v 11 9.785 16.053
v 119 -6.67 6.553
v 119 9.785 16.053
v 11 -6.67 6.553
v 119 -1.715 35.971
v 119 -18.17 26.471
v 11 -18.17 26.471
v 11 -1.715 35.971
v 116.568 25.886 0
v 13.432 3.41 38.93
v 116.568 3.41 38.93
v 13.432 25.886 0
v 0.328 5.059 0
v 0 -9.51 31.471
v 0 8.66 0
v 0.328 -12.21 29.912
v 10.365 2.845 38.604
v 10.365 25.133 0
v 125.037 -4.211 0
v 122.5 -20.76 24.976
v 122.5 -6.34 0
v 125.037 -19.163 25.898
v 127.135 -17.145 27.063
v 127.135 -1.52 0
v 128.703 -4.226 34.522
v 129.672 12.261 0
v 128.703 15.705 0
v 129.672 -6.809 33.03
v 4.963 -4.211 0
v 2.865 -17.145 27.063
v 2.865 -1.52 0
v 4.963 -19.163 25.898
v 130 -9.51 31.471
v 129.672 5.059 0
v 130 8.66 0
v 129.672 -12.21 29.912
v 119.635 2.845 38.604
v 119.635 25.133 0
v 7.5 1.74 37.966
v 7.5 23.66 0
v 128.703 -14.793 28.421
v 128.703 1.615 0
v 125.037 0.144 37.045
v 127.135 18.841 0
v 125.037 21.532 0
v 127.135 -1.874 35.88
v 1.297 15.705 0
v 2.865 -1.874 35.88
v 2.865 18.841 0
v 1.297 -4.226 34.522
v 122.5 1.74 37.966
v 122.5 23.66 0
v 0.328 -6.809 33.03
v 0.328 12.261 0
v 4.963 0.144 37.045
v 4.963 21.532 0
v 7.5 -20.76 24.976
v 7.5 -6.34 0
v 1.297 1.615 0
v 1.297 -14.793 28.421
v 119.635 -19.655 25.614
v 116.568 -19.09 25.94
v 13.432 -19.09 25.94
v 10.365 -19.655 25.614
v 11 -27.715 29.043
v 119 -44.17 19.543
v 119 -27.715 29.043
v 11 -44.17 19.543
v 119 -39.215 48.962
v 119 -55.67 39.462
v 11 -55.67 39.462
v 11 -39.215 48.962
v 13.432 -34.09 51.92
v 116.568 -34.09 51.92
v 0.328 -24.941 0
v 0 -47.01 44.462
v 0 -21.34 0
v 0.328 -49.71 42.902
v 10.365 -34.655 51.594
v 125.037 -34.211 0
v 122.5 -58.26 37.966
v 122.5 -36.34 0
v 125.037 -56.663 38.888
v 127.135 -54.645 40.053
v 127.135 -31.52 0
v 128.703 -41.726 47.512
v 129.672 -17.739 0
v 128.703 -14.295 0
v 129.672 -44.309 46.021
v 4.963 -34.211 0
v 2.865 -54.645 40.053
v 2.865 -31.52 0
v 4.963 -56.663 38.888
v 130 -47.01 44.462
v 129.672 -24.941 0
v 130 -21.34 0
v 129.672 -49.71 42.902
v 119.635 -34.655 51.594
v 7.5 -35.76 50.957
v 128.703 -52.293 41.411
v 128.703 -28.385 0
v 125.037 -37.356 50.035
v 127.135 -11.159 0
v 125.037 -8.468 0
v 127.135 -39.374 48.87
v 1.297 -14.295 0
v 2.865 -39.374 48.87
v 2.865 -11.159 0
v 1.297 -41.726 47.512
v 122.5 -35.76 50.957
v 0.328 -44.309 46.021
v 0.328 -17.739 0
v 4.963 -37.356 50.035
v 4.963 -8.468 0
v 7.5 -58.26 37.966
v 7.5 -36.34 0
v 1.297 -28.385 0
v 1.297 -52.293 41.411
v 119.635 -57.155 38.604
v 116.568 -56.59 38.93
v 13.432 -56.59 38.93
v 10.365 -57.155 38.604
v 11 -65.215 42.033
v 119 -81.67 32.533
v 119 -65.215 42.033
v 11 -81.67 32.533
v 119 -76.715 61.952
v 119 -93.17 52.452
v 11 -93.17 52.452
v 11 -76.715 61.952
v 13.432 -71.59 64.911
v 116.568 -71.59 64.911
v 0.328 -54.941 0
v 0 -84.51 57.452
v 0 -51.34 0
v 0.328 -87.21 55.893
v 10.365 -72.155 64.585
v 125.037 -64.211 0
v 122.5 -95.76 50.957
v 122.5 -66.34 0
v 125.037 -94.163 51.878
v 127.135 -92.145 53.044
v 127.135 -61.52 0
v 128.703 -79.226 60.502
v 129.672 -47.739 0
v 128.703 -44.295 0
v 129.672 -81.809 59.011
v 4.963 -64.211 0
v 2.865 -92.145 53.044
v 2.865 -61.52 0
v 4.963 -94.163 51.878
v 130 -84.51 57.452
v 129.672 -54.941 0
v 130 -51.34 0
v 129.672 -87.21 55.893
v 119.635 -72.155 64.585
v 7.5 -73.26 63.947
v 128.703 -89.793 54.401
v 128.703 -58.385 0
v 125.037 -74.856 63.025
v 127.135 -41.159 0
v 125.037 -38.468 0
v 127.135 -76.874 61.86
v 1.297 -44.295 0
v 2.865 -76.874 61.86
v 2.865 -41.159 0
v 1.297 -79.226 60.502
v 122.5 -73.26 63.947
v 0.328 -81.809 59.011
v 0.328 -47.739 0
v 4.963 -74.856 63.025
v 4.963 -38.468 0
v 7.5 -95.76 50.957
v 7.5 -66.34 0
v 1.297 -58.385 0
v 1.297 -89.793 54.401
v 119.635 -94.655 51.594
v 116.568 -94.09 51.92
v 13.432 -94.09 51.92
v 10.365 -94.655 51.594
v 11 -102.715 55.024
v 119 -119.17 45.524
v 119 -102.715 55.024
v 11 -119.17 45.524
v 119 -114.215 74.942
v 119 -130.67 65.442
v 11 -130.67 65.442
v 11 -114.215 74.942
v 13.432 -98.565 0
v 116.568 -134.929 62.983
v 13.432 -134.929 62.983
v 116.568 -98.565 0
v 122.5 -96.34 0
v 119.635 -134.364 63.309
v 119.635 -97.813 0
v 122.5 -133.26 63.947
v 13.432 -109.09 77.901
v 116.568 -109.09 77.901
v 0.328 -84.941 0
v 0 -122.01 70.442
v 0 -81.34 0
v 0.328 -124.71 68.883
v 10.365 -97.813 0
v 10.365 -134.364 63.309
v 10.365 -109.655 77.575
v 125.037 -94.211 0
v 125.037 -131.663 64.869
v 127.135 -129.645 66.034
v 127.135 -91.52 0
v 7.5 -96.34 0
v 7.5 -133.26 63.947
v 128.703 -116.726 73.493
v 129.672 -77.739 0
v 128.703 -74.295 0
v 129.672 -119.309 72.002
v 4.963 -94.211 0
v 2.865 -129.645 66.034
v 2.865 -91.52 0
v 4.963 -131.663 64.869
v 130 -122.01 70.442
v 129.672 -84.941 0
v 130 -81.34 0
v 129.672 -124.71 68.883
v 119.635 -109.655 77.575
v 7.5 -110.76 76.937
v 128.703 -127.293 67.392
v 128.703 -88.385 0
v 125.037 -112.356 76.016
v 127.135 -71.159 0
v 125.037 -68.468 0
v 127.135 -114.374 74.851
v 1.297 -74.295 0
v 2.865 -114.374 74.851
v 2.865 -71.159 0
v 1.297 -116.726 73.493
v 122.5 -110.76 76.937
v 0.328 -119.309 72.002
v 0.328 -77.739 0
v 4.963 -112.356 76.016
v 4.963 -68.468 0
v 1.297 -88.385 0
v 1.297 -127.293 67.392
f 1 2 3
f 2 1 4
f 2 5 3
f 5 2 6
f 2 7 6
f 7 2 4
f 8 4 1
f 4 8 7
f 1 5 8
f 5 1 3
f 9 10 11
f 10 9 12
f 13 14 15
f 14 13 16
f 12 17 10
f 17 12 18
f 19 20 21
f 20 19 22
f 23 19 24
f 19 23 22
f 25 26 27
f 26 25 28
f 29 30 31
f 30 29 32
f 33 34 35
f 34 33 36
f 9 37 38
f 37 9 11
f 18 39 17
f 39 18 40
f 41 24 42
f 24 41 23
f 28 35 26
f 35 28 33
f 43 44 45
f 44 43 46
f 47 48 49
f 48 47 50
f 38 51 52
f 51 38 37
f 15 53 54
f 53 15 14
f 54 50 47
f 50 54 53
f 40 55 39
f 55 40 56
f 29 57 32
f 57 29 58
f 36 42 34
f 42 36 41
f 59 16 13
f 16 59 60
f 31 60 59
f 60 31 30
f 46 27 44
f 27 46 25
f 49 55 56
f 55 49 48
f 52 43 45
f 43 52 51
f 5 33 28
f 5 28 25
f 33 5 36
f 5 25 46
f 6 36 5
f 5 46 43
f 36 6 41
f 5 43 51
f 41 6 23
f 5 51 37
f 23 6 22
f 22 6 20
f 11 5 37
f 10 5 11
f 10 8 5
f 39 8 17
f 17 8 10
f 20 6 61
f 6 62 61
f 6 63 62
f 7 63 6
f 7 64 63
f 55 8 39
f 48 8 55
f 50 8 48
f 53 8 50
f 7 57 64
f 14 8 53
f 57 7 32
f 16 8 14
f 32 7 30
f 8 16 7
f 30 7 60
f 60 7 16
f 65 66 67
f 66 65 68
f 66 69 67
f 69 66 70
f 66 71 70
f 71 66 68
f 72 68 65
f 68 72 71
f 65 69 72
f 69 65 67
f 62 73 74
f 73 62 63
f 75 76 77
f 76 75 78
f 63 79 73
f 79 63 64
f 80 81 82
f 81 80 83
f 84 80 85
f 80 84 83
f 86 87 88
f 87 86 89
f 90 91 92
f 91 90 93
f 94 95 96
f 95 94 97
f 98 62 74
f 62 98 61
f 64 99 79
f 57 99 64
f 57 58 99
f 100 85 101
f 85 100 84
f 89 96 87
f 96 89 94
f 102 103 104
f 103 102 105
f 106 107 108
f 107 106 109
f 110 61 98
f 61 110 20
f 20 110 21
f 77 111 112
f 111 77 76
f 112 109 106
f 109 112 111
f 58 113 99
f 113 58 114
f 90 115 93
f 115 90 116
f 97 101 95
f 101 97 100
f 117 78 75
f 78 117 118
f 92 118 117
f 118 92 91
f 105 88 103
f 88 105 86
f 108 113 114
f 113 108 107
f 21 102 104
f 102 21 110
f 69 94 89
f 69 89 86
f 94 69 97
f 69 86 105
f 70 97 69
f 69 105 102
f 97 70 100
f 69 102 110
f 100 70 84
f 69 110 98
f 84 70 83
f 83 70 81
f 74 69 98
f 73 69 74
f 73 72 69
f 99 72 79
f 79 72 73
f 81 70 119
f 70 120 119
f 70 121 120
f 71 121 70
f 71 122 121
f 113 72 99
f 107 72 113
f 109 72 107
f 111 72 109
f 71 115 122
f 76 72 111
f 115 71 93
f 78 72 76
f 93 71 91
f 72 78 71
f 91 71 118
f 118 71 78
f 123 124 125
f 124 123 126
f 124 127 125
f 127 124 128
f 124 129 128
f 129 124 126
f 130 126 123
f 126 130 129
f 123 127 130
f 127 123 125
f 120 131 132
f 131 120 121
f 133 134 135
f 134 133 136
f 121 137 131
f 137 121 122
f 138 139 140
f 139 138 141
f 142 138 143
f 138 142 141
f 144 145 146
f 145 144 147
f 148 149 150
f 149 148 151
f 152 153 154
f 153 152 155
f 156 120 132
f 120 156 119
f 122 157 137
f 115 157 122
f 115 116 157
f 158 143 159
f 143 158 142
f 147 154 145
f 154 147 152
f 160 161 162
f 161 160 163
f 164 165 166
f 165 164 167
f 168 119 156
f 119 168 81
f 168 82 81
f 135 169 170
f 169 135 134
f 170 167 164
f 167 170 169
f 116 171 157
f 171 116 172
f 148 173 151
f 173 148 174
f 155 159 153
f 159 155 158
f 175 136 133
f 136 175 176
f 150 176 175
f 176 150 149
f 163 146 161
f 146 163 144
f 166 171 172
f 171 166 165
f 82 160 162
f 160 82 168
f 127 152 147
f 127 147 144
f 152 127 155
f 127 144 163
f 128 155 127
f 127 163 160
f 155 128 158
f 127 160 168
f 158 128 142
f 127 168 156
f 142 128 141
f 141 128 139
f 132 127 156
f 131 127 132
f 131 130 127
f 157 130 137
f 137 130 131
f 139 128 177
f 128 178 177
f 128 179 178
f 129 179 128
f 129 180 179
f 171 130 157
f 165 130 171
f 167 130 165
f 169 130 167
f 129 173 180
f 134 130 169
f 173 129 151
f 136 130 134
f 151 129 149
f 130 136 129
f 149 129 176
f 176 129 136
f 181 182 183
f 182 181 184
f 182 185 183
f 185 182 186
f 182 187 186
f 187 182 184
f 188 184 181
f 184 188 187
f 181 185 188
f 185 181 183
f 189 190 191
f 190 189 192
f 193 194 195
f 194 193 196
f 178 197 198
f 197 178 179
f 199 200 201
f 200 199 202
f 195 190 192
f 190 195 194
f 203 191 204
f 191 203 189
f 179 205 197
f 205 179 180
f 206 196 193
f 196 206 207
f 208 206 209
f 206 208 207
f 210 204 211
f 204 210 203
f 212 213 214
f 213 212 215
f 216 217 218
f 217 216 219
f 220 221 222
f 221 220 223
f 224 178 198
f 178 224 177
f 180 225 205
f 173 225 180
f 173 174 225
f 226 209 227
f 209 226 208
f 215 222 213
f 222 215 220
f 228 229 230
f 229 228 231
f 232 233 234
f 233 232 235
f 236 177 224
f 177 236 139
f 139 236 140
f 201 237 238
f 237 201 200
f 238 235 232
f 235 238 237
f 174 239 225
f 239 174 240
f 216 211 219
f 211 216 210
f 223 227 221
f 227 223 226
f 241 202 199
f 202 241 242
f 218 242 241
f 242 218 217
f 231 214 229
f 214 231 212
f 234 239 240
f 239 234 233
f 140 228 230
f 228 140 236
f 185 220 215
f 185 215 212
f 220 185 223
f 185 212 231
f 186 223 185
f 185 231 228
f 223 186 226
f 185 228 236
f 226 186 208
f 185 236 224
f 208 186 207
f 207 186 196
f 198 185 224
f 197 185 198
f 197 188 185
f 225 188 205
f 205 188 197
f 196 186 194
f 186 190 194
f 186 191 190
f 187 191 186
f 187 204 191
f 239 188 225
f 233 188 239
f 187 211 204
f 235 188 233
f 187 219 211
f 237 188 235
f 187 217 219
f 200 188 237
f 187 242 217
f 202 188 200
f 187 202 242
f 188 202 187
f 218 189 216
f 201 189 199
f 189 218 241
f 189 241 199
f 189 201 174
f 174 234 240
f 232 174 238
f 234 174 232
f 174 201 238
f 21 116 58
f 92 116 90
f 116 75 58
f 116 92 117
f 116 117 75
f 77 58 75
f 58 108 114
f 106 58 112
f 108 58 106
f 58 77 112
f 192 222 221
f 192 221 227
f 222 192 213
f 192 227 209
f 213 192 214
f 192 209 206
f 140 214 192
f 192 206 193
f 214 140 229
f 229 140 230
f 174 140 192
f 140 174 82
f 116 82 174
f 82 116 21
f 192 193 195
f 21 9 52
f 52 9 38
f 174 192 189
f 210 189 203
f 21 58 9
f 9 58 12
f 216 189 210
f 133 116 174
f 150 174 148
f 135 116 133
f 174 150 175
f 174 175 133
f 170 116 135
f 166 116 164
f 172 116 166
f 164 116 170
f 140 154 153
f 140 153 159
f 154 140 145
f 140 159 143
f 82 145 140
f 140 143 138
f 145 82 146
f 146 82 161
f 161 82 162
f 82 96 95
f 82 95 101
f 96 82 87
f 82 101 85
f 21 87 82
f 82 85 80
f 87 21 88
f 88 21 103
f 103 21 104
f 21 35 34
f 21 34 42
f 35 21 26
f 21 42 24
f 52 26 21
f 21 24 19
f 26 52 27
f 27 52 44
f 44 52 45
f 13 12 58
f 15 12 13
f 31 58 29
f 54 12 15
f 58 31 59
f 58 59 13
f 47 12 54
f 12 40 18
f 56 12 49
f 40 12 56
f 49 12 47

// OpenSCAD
//Amount of cart slots
cart_count = 4; //[1:1:8]
//Cart type
cart_type = 5; //[0:Snes PAL, 1:Snes NTSC, 2:N64, 3:Gameboy/GBA, 4:DS/3DS, 5:NES]
//Support leg length (mm)
support_legs_length = 0; //[0:1:100]
//Cart angle (degree)
cart_angle = 30; //[0:1:30]
//Leveled
leveled = 0; //[0:False, 1:True]

module cart_cup(cup_height, cup_width, cup_depth, cart_hole_depth, support_legs_length, cup_angle) {
    
    difference() {
        
        union() {
            translate([0,cup_depth/2,0])
            hull() {
                translate([cup_depth/2,0,0])
                cylinder(h=cup_height, d=cup_depth);
                
                translate([cup_width-cup_depth/2,0,0])
                cylinder(h=cup_height, d=cup_depth);
            }
            
            
            for(j = [cup_width/4, cup_width*3/4]) {
            
                translate([j - 10/2, -(support_legs_length*cos(cup_angle)), 
                                                cup_depth*sin(cup_angle)])
                cube([10,   support_legs_length*cos(cup_angle),
                            support_legs_length*sin(cup_angle)]);
            }

        }
        translate([cup_width/2,0,cup_height-cart_hole_depth])
        children();
    }
}
    
module nescart() {
    translate([-108/2,5,0])
    linear_extrude(24)
    polygon([[0,0],[108,0],
            [108,19],[0,19]]);
    
    translate([-122/2,5,24])
    linear_extrude(110)
    polygon([[0,0],[122,0],
            [122,19],[0,19]]);
    
};
    
module snescart_pal() {
    translate([-130/2,5,0])
    linear_extrude(88)
    polygon([[0,0],[130,0],
            [130,10],[127,16],[120,18],[100,20],[70,22],
            [60,22],[30,20],[10,18],[3,16],[0,10]]);
    
};


module snescart_ntsc() {
    translate([-130/2,5,0])
    linear_extrude(88)
    polygon([
        [-4,0],[-4,19],[17,19],[17,22],
        [113,22],[113,19],[134,19],[134,0]    
    ]);
    
};

module gameboycart() {
    translate([-58/2,3,0])
    linear_extrude(65)
    polygon([[0,0],[58,0],
            [58,8],[0,8]]);
    
};

module dscart() {
    translate([-34/2,3,0])
    linear_extrude(35)
    polygon([[0,0],[34,0],
            [34,4.5],[0,4.5]]);
    
};

module n64cart() {
    translate([-118/2,5,0])
    linear_extrude(76)
    polygon([[0,0],[0,9],[1,13],[2,15],[3,16],[6,18],[9,19],
            [118-9,19],[118-6,18],[118-3,16],[118-2,15],[118-1,13],[118,9],[118,0]]);
    
};

module cart_stand(  amount_of_carts, delta_y, delta_h, angle,
                    cup_height, cup_width, cup_depth, cart_hole_depth, support_legs_length) {

    cut_from_bottom = sin(angle)*cup_depth;
                        
    difference() {
        union() {
            
            for(i = [0:amount_of_carts-1]) {
                translate([0, -i*delta_y, -cut_from_bottom])
                rotate([angle, 0, 0]) 
                    if (i==(amount_of_carts-1))
                        cart_cup(   cup_height + i*delta_h, cup_width, cup_depth,  
                                    cart_hole_depth, support_legs_length,                                                 angle) 
                        #children();
                    else
                        cart_cup(   cup_height + i*delta_h, cup_width, cup_depth,  
                                   cart_hole_depth, 0, 0)
                        #children();
                    
                    
                
            }
        }
        //ground
        translate([0, -delta_y*amount_of_carts - support_legs_length, -cut_from_bottom - support_legs_length])
        cube([cup_width, delta_y*(amount_of_carts+1) + support_legs_length, cut_from_bottom + support_legs_length]);
    }
}

//cart_stand(  amount_of_carts, delta_y, delta_h, angle,
//             cup_height, cup_width, cup_depth, cart_hole_depth, support_legs_length)

//cart_type: [0:Snes PAL, 1:Snes NTSC, 2:N64, 3:Gameboy/GBA, 4:DS/3DS]



if (cart_type == 0) {
    cart_stand(cart_count, 30, (leveled==1) ? 0 : 15, cart_angle, 30, 150, 30, 15, support_legs_length) snescart_pal();
}
if (cart_type == 1) {
    cart_stand(cart_count, 30, (leveled==1) ? 0 : 15, cart_angle, 30, 150, 30, 15, support_legs_length) snescart_ntsc();
}
if (cart_type == 2) {
    cart_stand(cart_count, 26, (leveled==1) ? 0 : 15, cart_angle, 30, 130, 26, 15, support_legs_length) n64cart();
}
if (cart_type == 3) {
    cart_stand(cart_count, 14, (leveled==1) ? 0 : 8, cart_angle, 15, 68, 14, 6, support_legs_length) gameboycart();
}
if (cart_type == 4) {
    cart_stand(cart_count, 9, (leveled==1) ? 0 : 5, cart_angle, 12, 40, 10, 6, support_legs_length) dscart();
}
if (cart_type == 5) {
    cart_stand(cart_count, 30, (leveled==1) ? 0 : 15, cart_angle, 45, 130, 30, 23, support_legs_length) nescart();
}
